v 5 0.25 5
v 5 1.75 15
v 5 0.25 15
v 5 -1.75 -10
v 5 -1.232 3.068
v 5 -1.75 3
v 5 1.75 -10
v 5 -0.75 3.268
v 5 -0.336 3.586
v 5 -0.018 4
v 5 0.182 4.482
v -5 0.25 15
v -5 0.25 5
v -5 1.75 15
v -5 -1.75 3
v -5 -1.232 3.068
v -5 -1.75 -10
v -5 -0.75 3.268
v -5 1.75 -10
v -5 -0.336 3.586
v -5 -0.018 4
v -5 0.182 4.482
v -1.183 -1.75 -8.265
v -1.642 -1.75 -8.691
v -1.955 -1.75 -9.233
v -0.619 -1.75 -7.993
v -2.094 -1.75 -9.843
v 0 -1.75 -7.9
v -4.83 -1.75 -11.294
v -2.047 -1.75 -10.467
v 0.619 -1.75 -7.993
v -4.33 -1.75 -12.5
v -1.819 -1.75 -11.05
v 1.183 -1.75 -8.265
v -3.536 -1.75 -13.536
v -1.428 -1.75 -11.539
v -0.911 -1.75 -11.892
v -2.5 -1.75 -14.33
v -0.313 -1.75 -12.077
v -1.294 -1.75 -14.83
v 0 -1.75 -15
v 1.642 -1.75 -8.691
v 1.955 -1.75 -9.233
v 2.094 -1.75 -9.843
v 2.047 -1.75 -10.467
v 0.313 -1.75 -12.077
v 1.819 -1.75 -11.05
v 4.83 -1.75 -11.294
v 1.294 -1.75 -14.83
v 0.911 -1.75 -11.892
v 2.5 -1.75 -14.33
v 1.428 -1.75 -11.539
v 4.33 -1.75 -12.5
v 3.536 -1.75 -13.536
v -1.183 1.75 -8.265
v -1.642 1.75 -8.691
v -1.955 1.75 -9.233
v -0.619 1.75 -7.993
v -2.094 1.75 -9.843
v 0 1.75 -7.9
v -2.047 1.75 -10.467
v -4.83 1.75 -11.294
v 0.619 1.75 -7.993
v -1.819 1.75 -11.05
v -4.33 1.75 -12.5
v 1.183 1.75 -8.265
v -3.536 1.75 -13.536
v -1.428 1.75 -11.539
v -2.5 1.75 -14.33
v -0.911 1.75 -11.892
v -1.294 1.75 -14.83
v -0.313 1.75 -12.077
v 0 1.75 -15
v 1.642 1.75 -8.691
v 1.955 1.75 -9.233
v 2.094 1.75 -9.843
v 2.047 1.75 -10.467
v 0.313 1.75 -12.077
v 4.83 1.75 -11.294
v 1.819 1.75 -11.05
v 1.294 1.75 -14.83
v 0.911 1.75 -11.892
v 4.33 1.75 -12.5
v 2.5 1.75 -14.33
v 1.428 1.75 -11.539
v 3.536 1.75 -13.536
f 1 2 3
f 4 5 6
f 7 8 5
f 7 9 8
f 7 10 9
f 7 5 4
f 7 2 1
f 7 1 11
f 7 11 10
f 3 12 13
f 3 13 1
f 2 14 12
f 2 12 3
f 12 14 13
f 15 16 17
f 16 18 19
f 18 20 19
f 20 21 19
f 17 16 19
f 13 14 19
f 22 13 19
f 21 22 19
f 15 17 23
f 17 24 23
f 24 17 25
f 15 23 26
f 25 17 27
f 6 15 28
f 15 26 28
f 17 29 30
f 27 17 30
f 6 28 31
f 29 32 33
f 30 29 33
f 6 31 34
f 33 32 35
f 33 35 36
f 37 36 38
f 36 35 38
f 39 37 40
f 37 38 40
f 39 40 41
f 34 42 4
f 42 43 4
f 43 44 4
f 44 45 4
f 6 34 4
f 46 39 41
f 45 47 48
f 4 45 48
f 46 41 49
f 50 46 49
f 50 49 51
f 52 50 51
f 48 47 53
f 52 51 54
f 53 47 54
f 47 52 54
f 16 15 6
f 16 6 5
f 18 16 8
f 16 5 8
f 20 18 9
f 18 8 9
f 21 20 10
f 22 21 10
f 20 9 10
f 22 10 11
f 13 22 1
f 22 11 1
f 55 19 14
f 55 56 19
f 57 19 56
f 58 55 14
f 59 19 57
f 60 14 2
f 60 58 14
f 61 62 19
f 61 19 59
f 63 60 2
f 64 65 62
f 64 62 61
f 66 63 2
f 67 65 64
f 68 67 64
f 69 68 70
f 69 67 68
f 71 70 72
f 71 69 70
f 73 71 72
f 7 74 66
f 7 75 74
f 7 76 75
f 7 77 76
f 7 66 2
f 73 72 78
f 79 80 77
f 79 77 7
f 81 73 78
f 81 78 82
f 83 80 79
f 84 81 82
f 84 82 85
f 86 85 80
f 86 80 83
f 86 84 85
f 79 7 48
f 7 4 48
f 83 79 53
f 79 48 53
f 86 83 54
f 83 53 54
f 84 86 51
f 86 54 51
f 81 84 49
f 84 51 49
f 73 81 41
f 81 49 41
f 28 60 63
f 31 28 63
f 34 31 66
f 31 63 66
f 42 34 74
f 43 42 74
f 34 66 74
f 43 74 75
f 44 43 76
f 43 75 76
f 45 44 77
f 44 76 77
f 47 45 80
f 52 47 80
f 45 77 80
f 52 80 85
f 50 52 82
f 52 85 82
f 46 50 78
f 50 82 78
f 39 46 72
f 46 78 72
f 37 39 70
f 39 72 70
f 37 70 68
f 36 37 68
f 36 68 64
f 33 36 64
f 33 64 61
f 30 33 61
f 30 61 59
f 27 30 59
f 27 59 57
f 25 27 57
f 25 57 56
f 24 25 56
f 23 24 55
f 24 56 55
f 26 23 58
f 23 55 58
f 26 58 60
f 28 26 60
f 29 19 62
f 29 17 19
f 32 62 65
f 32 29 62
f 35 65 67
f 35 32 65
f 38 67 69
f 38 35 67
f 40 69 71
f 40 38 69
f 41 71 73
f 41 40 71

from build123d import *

# Parameters (mm, degrees)
CROQUIS1_W              = 10
CROQUIS1_H              = 30
SALIENTE_EXTRUIR1_DEPTH = 1.75
REDONDEO1_R             = 5
CROQUIS2_R              = 2.1
CORTAR_EXTRUIR1_DEPTH   = 3.5
CROQUIS3_W              = 10
CROQUIS3_H              = 12
CORTAR_EXTRUIR2_DEPTH   = 2
REDONDEO2_R             = 2


with BuildPart() as part:
    # Croquis1 → Saliente-Extruir1 (new, symmetric)
    with BuildSketch(Plane(origin=(0, 0, 0), x_dir=(1, 0, 0), z_dir=(0, 1, 0))):
        Rectangle(CROQUIS1_W, CROQUIS1_H)
    extrude(amount=SALIENTE_EXTRUIR1_DEPTH, both=True)

    # Redondeo1
    redondeo1_edges = [part.edges().sort_by_distance(p)[0] for p in [
        (5, 0, -15),
        (-5, 0, -15),
    ]]
    fillet(redondeo1_edges, radius=REDONDEO1_R - 0.0001)  # a hair under: the kernel refuses the full size

    # Croquis2 → Cortar-Extruir1 (cut)
    with BuildSketch(Plane(origin=(0, 1.75, 0), x_dir=(1, 0, 0), z_dir=(0, 1, 0))):
        with Locations(Location((0, 10, 0), (0, 0, 270))):
            Circle(CROQUIS2_R)
    extrude(amount=-CORTAR_EXTRUIR1_DEPTH, mode=Mode.SUBTRACT)

    # Croquis3 → Cortar-Extruir2 (cut)
    with BuildSketch(Plane.XZ.offset(1.75)):
        with Locations((0, 9)):
            Rectangle(CROQUIS3_W, CROQUIS3_H)
    extrude(amount=-CORTAR_EXTRUIR2_DEPTH, mode=Mode.SUBTRACT)

    # Redondeo2
    redondeo2_edges = [part.edges().sort_by_distance(p)[0] for p in [
        (0, 0.25, 3),
    ]]
    fillet(redondeo2_edges, radius=REDONDEO2_R - 0.0001)  # a hair under: the kernel refuses the full size


solid = part.part
